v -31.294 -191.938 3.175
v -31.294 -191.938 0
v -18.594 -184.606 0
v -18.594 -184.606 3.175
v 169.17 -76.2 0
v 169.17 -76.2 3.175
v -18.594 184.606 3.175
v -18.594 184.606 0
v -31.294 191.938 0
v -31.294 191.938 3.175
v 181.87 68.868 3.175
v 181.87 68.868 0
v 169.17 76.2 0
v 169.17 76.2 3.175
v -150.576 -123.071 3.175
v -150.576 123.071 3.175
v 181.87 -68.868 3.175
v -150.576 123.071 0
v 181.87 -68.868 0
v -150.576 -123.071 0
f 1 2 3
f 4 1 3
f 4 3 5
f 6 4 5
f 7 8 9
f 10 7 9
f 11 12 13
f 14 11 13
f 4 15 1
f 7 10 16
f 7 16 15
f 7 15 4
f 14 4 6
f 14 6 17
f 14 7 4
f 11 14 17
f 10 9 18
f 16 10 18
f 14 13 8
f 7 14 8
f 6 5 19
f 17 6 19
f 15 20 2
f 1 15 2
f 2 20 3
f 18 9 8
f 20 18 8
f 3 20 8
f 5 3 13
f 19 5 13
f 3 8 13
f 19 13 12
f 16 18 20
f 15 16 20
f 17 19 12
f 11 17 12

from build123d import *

# Parameters (mm, degrees)
F1_DEPTH = 3.175


with BuildPart() as f1:
    # F0 (on Top) → F1 (new body)
    with BuildSketch(Plane.XY):
        Polygon((-18.594091, -184.605909), (169.170453, -76.2), (169.170453, 76.2), (-18.594091, 184.605909), (-150.576362, 108.405909), (-150.576362, -108.405909), align=None)
        Polygon((-31.294091, -191.938258), (-18.594091, -184.605909), (-150.576362, -108.405909), (-150.576362, -123.070606), align=None)
        Polygon((-150.576362, 108.405909), (-18.594091, 184.605909), (-31.294091, 191.938258), (-150.576362, 123.070606), align=None)
        Polygon((169.170453, 76.2), (169.170453, -76.2), (181.870453, -68.867652), (181.870453, 68.867652), align=None)
    extrude(amount=F1_DEPTH)


solid = f1.part
